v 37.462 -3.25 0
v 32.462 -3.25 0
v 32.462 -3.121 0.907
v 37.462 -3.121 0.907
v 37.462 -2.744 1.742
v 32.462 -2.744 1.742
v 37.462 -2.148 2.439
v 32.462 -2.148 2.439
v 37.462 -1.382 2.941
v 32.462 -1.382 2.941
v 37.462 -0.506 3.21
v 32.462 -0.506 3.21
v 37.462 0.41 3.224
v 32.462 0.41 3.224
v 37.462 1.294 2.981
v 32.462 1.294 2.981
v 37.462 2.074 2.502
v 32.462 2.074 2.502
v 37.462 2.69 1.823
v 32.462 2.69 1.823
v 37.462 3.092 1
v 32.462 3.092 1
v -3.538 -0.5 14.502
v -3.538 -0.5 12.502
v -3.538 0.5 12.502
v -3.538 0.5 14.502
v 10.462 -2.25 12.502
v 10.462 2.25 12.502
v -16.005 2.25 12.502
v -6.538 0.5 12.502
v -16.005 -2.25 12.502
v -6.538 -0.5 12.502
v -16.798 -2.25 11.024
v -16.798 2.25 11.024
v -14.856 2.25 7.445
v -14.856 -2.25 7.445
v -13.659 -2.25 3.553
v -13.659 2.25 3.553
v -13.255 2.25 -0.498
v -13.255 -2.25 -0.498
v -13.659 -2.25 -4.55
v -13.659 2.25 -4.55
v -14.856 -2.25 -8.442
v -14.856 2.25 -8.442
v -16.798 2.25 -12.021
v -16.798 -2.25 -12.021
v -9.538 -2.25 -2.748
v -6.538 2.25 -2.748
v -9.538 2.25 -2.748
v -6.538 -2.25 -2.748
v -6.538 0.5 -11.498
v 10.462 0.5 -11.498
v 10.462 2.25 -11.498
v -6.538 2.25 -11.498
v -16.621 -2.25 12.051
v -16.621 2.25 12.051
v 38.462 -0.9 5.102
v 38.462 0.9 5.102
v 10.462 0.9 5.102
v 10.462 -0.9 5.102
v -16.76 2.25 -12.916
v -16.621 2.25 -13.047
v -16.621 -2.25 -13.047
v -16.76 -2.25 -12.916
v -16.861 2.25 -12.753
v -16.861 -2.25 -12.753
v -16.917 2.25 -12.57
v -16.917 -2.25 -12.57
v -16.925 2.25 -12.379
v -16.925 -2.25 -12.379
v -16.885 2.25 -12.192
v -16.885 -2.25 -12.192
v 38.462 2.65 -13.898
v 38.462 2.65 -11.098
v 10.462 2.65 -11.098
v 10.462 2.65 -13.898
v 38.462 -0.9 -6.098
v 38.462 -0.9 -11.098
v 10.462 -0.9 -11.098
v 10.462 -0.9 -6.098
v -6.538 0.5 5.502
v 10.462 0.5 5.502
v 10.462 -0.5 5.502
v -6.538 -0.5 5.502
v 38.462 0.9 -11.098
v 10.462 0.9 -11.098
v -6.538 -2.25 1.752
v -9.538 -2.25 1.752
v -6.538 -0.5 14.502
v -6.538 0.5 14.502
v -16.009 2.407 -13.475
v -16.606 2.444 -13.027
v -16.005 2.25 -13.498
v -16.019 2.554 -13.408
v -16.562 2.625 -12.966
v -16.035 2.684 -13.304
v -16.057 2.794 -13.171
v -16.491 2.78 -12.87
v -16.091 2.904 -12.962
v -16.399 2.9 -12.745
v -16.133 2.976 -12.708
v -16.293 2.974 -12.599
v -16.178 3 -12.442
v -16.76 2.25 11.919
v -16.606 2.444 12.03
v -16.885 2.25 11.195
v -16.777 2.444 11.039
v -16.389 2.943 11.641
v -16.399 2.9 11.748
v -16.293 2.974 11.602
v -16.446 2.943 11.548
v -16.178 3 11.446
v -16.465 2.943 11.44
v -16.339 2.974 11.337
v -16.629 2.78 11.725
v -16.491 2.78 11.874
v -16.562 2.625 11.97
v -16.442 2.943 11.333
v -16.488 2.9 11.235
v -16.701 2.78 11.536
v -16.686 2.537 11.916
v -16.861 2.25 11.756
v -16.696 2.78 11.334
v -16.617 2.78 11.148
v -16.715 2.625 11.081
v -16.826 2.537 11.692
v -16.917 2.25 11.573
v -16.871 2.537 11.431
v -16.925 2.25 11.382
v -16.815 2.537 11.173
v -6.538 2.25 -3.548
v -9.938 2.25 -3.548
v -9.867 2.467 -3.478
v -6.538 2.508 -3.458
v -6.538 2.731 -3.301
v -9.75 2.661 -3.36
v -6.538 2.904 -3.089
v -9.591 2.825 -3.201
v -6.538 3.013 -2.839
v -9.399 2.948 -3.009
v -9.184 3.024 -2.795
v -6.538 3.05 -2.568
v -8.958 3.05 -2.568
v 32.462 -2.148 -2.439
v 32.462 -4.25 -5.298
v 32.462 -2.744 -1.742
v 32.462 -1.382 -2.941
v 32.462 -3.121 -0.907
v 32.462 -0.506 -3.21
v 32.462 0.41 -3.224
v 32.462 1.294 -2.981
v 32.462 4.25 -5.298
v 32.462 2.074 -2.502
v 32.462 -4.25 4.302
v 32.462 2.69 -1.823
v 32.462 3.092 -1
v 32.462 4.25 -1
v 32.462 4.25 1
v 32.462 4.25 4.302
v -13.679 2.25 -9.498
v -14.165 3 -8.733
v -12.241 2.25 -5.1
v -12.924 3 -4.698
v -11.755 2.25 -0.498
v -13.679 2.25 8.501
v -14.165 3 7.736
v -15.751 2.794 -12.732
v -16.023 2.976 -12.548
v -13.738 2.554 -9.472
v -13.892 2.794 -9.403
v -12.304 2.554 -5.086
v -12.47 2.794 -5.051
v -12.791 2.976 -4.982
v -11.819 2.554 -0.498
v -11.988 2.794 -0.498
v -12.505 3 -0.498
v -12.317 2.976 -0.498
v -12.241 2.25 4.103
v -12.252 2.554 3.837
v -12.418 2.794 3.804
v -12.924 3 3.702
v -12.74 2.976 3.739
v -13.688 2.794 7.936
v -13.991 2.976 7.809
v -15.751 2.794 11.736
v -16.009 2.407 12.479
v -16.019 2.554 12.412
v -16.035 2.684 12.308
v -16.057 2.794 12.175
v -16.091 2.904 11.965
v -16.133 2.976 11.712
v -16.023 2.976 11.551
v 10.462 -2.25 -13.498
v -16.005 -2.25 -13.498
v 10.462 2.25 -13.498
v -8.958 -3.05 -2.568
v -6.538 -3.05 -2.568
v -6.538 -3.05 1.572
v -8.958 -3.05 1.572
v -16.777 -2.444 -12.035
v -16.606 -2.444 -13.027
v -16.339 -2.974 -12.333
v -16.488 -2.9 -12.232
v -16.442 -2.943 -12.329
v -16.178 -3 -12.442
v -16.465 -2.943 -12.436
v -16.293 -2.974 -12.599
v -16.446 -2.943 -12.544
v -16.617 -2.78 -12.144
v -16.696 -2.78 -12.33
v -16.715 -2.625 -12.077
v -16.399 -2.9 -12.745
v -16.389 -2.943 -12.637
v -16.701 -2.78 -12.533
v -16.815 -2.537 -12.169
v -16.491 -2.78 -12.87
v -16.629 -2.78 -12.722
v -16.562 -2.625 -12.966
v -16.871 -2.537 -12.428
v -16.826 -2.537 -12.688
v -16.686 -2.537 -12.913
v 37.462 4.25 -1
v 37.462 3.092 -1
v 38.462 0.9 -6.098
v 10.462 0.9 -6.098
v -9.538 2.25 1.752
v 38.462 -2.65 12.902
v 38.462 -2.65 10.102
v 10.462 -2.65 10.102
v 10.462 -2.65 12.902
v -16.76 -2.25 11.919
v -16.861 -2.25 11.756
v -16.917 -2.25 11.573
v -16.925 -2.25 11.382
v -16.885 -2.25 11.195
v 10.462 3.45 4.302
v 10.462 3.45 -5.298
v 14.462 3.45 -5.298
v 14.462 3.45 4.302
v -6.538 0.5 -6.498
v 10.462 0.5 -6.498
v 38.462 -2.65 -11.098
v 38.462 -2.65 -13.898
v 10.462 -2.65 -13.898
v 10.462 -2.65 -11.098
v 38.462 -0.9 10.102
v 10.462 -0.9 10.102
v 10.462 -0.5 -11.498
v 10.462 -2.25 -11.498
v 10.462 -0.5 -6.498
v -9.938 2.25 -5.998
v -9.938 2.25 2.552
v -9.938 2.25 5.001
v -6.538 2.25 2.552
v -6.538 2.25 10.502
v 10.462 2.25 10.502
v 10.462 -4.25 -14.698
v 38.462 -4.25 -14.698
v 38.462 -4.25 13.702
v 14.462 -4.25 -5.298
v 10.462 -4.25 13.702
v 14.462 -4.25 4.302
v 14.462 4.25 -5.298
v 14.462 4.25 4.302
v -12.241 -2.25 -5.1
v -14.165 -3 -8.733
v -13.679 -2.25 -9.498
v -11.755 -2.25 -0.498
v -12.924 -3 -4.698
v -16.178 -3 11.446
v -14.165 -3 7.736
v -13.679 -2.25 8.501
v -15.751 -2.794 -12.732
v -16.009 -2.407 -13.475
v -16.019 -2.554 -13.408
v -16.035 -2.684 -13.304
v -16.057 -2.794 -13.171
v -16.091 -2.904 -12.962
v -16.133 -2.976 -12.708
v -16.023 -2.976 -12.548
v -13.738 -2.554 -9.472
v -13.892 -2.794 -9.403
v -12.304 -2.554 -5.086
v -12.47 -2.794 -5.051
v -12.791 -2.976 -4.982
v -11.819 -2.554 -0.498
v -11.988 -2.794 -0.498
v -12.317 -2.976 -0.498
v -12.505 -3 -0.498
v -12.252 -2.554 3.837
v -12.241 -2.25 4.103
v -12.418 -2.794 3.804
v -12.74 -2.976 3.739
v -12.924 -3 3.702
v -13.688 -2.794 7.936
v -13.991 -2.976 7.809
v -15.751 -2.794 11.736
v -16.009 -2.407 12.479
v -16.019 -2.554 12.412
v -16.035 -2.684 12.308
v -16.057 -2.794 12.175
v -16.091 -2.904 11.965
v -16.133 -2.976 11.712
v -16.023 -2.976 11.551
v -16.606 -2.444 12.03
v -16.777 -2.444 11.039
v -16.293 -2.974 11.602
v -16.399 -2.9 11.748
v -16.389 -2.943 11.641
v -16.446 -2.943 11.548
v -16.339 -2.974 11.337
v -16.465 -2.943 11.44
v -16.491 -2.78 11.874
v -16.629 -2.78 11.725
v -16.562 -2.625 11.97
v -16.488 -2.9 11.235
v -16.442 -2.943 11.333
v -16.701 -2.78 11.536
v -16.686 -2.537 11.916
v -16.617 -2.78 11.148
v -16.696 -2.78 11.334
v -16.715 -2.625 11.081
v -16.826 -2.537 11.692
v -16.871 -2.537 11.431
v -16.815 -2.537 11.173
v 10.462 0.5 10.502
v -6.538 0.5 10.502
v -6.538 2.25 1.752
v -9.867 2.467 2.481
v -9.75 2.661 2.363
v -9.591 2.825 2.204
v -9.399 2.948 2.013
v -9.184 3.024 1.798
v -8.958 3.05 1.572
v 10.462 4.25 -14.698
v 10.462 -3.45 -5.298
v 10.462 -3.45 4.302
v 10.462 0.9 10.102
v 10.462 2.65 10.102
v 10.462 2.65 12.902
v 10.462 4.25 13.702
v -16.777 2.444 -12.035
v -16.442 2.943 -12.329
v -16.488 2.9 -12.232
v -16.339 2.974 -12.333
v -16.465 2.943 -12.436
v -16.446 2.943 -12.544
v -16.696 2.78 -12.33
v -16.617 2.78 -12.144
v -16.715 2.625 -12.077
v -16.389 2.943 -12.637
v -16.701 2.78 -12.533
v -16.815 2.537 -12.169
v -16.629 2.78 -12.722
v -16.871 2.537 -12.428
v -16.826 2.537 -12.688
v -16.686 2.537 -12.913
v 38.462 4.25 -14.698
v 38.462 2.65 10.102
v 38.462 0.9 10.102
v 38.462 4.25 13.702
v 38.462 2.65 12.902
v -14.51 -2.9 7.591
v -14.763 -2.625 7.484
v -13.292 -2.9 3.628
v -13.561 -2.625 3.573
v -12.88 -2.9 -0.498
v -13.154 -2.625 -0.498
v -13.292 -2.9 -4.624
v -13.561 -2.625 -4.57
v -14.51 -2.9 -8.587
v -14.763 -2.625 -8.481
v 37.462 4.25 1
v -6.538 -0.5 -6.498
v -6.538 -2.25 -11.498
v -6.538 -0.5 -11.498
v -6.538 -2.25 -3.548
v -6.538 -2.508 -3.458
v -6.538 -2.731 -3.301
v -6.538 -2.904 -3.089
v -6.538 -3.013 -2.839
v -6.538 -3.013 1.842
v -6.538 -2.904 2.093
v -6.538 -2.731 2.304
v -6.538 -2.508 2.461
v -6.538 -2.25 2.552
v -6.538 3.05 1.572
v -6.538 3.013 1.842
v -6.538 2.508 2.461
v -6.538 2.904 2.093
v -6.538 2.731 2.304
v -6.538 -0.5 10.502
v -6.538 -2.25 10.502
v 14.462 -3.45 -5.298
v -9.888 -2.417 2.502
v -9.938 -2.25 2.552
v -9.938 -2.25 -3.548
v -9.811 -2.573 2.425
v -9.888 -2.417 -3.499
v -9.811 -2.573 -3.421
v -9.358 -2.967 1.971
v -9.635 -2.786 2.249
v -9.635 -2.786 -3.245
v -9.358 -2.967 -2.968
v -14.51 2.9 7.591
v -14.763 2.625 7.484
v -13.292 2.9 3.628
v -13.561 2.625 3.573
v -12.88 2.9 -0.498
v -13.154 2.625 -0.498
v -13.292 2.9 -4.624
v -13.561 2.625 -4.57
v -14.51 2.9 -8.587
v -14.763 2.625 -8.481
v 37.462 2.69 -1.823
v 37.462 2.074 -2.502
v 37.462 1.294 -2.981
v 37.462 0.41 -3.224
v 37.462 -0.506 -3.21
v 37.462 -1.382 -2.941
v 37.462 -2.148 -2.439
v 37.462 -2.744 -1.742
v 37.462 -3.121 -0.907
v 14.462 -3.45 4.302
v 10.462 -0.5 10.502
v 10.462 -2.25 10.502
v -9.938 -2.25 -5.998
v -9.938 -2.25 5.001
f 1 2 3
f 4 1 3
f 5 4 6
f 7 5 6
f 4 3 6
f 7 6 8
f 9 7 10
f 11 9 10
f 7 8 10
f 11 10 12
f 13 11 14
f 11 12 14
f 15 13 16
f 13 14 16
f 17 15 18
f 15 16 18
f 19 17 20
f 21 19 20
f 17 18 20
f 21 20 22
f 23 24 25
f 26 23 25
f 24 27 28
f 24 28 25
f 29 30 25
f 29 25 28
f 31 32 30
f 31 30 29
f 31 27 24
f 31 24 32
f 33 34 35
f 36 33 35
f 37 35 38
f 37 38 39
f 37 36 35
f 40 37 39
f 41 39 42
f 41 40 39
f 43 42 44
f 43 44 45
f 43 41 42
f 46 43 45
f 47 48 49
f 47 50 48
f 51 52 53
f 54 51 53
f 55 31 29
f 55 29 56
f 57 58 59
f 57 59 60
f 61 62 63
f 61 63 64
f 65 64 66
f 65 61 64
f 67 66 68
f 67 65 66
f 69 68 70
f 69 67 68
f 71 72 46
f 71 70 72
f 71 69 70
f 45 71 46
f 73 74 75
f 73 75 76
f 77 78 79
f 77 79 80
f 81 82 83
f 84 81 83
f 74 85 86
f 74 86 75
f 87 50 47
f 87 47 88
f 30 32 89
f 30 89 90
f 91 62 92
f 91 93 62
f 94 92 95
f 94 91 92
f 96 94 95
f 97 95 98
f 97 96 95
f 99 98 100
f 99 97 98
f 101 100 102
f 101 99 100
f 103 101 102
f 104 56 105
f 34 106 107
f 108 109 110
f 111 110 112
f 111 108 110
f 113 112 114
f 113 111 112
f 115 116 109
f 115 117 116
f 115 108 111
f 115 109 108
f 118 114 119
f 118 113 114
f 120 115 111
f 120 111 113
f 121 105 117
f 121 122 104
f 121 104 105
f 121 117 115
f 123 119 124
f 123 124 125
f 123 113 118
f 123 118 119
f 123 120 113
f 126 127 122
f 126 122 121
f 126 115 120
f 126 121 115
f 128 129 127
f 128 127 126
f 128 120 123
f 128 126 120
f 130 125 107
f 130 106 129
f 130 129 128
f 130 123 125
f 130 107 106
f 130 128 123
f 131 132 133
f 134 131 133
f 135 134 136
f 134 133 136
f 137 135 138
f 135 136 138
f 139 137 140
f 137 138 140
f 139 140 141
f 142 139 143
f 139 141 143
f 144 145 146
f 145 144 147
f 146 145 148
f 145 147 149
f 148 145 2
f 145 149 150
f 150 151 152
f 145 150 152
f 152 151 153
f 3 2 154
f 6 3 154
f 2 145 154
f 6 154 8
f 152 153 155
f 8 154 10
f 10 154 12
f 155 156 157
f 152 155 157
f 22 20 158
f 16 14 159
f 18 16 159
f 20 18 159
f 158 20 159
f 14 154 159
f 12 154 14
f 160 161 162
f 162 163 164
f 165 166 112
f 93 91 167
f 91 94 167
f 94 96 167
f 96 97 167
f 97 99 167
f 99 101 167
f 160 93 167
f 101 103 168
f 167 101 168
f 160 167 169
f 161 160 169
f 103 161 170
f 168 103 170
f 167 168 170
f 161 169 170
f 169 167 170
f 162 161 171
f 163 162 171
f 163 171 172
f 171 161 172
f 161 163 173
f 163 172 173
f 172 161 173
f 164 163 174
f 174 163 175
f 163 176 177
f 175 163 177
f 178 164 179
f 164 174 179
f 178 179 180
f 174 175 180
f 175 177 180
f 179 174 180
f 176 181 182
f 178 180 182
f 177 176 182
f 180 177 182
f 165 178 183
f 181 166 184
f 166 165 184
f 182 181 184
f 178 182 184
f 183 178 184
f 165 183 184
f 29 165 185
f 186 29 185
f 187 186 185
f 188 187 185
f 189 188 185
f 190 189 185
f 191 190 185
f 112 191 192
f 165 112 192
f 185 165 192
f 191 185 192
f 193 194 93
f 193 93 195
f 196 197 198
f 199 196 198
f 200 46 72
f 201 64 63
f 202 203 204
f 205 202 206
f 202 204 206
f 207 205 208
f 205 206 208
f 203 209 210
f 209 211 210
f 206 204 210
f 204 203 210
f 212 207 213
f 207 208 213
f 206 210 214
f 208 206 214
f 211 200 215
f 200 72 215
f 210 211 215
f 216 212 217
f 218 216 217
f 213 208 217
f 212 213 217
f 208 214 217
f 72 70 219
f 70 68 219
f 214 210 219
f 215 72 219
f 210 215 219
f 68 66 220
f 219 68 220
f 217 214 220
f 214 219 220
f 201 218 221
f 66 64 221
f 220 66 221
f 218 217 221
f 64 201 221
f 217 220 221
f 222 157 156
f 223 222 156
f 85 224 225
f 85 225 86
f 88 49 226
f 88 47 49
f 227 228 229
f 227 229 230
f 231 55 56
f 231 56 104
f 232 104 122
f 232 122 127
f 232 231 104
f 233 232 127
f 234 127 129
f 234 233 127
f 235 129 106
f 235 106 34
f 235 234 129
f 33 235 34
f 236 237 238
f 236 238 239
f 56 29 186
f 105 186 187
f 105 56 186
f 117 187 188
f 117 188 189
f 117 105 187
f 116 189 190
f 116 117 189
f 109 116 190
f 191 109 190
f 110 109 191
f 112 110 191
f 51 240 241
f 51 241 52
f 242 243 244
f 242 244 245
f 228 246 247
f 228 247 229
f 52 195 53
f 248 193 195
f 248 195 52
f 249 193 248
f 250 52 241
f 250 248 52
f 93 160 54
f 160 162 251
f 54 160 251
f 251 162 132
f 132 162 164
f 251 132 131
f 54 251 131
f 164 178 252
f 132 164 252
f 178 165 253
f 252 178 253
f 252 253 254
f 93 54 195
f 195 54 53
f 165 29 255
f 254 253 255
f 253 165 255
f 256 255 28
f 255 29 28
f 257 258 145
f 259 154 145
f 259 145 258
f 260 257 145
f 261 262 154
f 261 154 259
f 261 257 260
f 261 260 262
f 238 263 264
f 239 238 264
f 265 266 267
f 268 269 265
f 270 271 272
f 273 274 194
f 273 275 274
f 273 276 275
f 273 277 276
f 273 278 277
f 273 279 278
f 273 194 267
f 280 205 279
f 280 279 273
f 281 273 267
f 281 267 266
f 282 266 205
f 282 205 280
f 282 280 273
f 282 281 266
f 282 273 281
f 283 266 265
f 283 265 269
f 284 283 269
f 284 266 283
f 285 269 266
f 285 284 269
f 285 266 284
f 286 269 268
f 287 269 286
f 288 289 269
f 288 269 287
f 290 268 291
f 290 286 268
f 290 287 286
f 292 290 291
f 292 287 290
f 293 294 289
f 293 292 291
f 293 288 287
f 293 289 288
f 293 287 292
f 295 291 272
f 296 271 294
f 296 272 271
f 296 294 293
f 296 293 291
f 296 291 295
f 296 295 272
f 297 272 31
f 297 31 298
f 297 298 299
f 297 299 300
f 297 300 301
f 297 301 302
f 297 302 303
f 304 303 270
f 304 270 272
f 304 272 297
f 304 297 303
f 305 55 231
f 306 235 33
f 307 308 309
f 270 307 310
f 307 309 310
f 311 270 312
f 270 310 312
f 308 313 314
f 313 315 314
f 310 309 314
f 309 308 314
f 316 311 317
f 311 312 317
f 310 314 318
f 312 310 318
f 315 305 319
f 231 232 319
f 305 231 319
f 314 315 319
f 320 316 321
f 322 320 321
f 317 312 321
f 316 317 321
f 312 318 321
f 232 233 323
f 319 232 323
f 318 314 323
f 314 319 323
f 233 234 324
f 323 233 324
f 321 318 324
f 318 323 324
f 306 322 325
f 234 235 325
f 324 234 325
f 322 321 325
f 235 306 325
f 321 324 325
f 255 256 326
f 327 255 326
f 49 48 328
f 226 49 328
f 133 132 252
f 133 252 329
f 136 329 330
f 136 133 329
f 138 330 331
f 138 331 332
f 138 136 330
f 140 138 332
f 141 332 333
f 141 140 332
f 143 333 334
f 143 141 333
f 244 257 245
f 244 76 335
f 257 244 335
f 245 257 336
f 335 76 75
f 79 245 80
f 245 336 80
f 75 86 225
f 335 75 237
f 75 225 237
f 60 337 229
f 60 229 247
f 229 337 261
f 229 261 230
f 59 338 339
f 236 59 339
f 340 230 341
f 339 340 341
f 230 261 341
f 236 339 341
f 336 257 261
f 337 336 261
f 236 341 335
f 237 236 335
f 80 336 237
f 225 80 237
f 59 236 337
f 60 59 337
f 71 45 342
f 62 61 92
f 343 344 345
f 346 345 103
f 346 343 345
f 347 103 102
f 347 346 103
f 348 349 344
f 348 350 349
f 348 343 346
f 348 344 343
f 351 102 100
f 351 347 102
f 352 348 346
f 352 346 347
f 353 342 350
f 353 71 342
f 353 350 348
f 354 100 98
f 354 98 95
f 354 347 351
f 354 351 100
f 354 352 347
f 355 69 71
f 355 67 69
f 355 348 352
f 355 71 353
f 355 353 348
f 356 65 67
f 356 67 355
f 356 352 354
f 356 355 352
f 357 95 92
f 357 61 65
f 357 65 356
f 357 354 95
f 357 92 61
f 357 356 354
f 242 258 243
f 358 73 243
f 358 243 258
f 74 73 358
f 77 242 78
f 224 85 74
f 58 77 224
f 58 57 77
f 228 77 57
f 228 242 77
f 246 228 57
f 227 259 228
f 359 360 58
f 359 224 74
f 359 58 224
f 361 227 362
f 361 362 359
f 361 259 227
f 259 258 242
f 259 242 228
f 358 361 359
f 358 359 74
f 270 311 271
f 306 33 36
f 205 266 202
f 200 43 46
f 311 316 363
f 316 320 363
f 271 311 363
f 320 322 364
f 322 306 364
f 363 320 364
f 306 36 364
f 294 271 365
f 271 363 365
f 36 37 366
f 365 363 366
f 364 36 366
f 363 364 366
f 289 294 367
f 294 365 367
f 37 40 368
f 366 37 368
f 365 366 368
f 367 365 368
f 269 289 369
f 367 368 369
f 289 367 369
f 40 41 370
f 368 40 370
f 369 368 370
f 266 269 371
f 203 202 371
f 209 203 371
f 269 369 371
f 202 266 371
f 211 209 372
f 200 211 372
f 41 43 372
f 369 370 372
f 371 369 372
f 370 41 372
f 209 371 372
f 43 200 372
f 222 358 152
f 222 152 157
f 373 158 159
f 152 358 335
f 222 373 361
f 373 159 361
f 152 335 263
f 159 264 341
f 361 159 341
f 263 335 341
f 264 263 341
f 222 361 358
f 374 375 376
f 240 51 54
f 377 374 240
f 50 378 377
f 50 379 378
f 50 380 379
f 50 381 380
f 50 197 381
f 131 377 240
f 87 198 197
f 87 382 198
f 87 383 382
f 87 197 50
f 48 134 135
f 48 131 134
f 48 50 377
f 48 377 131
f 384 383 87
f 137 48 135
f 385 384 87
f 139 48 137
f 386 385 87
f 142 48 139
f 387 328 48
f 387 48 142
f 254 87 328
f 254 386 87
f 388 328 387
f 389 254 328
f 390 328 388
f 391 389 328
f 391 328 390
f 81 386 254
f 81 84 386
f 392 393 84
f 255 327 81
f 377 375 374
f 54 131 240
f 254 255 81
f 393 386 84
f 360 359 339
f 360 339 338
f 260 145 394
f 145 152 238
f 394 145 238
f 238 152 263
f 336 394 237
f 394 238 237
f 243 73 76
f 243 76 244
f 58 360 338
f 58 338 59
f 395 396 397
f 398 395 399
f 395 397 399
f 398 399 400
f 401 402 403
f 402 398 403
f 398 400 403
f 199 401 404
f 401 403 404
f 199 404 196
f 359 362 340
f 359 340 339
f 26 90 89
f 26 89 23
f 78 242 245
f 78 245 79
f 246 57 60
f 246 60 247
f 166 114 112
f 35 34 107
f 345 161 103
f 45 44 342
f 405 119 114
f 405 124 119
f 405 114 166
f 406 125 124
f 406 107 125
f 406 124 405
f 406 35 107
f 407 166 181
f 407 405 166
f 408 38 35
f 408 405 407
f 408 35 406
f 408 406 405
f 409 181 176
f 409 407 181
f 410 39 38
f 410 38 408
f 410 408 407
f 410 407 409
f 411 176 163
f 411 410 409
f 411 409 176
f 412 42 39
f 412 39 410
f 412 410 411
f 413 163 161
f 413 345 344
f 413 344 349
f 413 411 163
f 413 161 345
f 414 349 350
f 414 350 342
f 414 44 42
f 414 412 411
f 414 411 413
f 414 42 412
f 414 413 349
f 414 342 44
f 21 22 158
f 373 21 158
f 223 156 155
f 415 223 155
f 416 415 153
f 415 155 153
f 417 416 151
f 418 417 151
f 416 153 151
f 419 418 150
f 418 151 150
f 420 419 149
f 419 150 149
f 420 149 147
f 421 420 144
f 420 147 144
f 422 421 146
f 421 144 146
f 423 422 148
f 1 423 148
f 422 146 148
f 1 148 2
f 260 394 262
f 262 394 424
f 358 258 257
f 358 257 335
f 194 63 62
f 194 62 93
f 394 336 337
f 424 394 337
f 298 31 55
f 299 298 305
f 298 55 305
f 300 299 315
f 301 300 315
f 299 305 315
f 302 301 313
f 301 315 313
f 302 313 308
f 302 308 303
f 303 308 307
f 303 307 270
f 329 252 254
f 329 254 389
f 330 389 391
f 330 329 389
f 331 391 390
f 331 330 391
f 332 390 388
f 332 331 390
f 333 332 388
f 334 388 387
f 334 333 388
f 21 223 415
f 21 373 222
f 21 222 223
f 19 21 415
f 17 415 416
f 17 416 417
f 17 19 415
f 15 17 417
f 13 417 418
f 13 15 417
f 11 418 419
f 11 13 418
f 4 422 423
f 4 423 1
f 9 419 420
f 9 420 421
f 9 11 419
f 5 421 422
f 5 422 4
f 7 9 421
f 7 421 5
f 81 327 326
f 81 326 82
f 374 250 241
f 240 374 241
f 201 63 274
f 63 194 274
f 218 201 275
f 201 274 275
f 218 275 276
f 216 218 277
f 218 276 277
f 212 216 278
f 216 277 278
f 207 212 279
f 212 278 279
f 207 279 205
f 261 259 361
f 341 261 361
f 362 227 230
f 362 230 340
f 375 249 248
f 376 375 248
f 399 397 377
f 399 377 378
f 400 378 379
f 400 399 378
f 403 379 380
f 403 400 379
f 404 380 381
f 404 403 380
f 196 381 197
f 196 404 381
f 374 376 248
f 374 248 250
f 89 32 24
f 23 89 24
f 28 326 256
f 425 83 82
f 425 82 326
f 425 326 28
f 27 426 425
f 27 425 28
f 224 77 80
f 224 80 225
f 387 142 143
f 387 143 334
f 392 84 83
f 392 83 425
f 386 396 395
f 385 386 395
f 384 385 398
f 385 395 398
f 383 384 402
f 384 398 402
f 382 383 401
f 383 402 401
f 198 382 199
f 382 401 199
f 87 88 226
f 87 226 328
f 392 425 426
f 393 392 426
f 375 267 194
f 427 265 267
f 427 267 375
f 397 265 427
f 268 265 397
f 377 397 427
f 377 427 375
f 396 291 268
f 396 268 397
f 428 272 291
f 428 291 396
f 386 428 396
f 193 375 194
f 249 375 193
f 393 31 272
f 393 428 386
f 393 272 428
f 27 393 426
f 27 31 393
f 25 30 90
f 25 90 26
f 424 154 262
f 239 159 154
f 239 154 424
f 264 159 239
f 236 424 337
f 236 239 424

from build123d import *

# Parameters (mm, degrees)
F1_DEPTH    = 2.25
F2_W        = 6.1
F2_H        = 6.1
F2_W_2      = 4.5
F2_H_2      = 4.5
F3_DEPTH    = 3.4
F5_DEPTH    = 3
F6_R        = 0.74999
F7_T1_DEPTH = 10.9989794856
F7_T3_DEPTH = 5.8494897428
F9_DEPTH    = 17
F10_W       = 3
F10_H       = 1
F11_DEPTH   = 2
F12_W       = 8.5
F12_H       = 28.4
F12_W_2     = 6.9
F12_H_2     = 9.6
F13_DEPTH   = 28
F15_W       = 22
F15_H       = 9.6
F16_DEPTH   = 15.5
F17_DEPTH   = 6
F19_DEPTH   = 5


# Not quite as in the source:
# - a fillet or chamfer that OpenCascade refuses, or shapes differently, is made with other operations: its cross-section is extruded or revolved along the edge and cut away or added
# - a fillet or chamfer is up to 0.001 mm smaller than in the source, because OpenCascade refuses the exact size


with BuildPart() as f1:
    # F0 (on Front) → F1 (new body, symmetric)
    with BuildSketch(Plane.XZ):
        with BuildLine():
            Line((-9.5380139407, -2.7482741908), (-9.5380139407, 1.7517258092))
            Line((-9.5380139407, 1.7517258092), (-6.5380139407, 1.7517258092))
            Line((-6.5380139407, 1.7517258092), (-6.5380139407, 4.7517258092))
            Line((-6.5380139407, 4.7517258092), (10.4619860593, 4.7517258092))
            Line((10.4619860593, 4.7517258092), (10.4619860593, 12.5017258092))
            Line((10.4619860593, 12.5017258092), (-16.0051570773, 12.5017258092))
            ThreePointArc((-16.0051570773, 12.5017258092), (-11.7548404249, -0.4982741908), (-16.0051570773, -13.4982741908))
            Line((-16.0051570773, -13.4982741908), (10.4619860593, -13.4982741908))
            Line((10.4619860593, -13.4982741908), (10.4619860593, -5.7482741908))
            Line((10.4619860593, -5.7482741908), (-6.5380139407, -5.7482741908))
            Line((-6.5380139407, -5.7482741908), (-6.5380139407, -2.7482741908))
            Line((-6.5380139407, -2.7482741908), (-9.5380139407, -2.7482741908))
        make_face()
    extrude(amount=F1_DEPTH, both=True)

    # F2 (on face) → F3 (join)
    with BuildSketch(Plane.YZ.offset(-6.5380139407)):
        with Locations((0, -0.4982741908)):
            Rectangle(F2_W, F2_H)
        with Locations((0, -0.4982741908)):
            Rectangle(F2_W_2, F2_H_2, mode=Mode.SUBTRACT)
    extrude(amount=-F3_DEPTH)

    # F4 (on Front) → F5 (join, symmetric)
    with BuildSketch(Plane.XZ):
        with BuildLine():
            ThreePointArc((-16.0051570773, -13.4982741908), (-11.7548404249, -0.4982741908), (-16.0051570773, 12.5017258092))
            Line((-16.0051570773, 12.5017258092), (-17.2154421685, 11.6156050511))
            ThreePointArc((-17.2154421685, 11.6156050511), (-13.2548404249, -0.4982741908), (-17.2154421685, -12.6121534326))
            Line((-17.2154421685, -12.6121534326), (-16.0051570773, -13.4982741908))
        make_face()
    extrude(amount=F5_DEPTH, both=True)

    # F6 (radius 0.75 in the source; OpenCascade refuses exactly that, so slightly less here)
    f6_edges = [f1.edges().sort_by_distance(p)[0] for p in [
        (-16.6103, -3, 12.058665),
        (-13.25484, -3, -0.498274),
        (-16.6103, -3, -13.055214),
        (-11.75484, -3, -0.498274),
        (-16.6103, 3, 12.058665),
        (-13.25484, 3, -0.498274),
        (-16.6103, 3, -13.055214),
        (-11.75484, 3, -0.498274),
        (-17.215442, 0, -12.612153),
        (-17.215442, 0, 11.615605),
    ]]
    fillet(f6_edges, radius=F6_R)

    # F7: fillet of radius 1 on 6 edges, made by hand

    # F7_s2 → F7_t1 (cut)
    with BuildSketch(Plane.XY.offset(-5.9977639336)):
        with BuildLine():
            ThreePointArc((-9.9380139407, -2.25), (-9.5906735756, -2.8245966692), (-8.9582180436, -3.05))
            Line((-8.9582180436, -3.05), (-9.9380139407, -3.05))
            Line((-9.9380139407, -3.05), (-9.9380139407, -2.25))
        make_face()
        with BuildLine():
            ThreePointArc((-9.9380139407, 2.25), (-9.5906735756, 2.8245966692), (-8.9582180436, 3.05))
            Line((-8.9582180436, 3.05), (-9.9380139407, 3.05))
            Line((-9.9380139407, 3.05), (-9.9380139407, 2.25))
        make_face()
    extrude(amount=F7_T1_DEPTH, mode=Mode.SUBTRACT)

    # F7_s4 → F7_t3 (cut)
    with BuildSketch(Plane.YZ.offset(-9.9380139407)):
        with BuildLine():
            ThreePointArc((-2.25, -3.5482741908), (-2.8245966692, -3.2009338257), (-3.05, -2.5684782937))
            Line((-3.05, -2.5684782937), (-3.05, -3.5482741908))
            Line((-3.05, -3.5482741908), (-2.25, -3.5482741908))
        make_face()
        with BuildLine():
            ThreePointArc((-2.25, 2.5517258092), (-2.8245966692, 2.2043854441), (-3.05, 1.5719299121))
            Line((-3.05, 1.5719299121), (-3.05, 2.5517258092))
            Line((-3.05, 2.5517258092), (-2.25, 2.5517258092))
        make_face()
        with BuildLine():
            ThreePointArc((2.25, 2.5517258092), (2.8245966692, 2.2043854441), (3.05, 1.5719299121))
            Line((3.05, 1.5719299121), (3.05, 2.5517258092))
            Line((3.05, 2.5517258092), (2.25, 2.5517258092))
        make_face()
        with BuildLine():
            ThreePointArc((2.25, -3.5482741908), (2.8245966692, -3.2009338257), (3.05, -2.5684782937))
            Line((3.05, -2.5684782937), (3.05, -3.5482741908))
            Line((3.05, -3.5482741908), (2.25, -3.5482741908))
        make_face()
    extrude(amount=F7_T3_DEPTH, mode=Mode.SUBTRACT)

    # F8 (on face) → F9 (cut, through all)
    with BuildSketch(Plane.YZ.offset(10.4619860593)):
        Polygon((-2.25, 10.5017258092), (-2.25, 4.7517258092), (2.25, 4.7517258092), (2.25, 10.5017258092), (0.5, 10.5017258092), (0.5, 5.5017258092), (-0.5, 5.5017258092), (-0.5, 10.5017258092), align=None)
        Polygon((2.25, -11.4982741908), (2.25, -5.7482741908), (-2.25, -5.7482741908), (-2.25, -11.4982741908), (-0.5, -11.4982741908), (-0.5, -6.4982741908), (0.5, -6.4982741908), (0.5, -11.4982741908), align=None)
    extrude(amount=-F9_DEPTH, mode=Mode.SUBTRACT)

    # F10 (on face) → F11 (join)
    with BuildSketch(Plane.XY.offset(12.5017258092)):
        with Locations((-5.0380139407, 0)):
            Rectangle(F10_W, F10_H)
    extrude(amount=F11_DEPTH)


with BuildPart() as f13:
    # F12 (on face) → F13 (new body)
    with BuildSketch(Plane.YZ.offset(10.4619860593)):
        with Locations((0, -0.4982741908)):
            Rectangle(F12_W, F12_H)
        Polygon((-0.9, -6.0982741908), (0.9, -6.0982741908), (0.9, -11.0982741908), (2.65, -11.0982741908), (2.65, -13.8982741908), (-2.65, -13.8982741908), (-2.65, -11.0982741908), (-0.9, -11.0982741908), align=None, mode=Mode.SUBTRACT)
        with Locations((0, -0.4982741908)):
            Rectangle(F12_W_2, F12_H_2, mode=Mode.SUBTRACT)
        Polygon((0.9, 10.1017258092), (0.9, 5.1017258092), (-0.9, 5.1017258092), (-0.9, 10.1017258092), (-2.65, 10.1017258092), (-2.65, 12.9017258092), (2.65, 12.9017258092), (2.65, 10.1017258092), align=None, mode=Mode.SUBTRACT)
    extrude(amount=F13_DEPTH)

    # F15 (on face) → F16 (cut)
    with BuildSketch(Plane(origin=(0, 4.25, 0), x_dir=(-1, 0, 0), z_dir=(0, 1, 0))):
        with Locations((-25.4619860593, -0.4982741908)):
            Rectangle(F15_W, F15_H)
    extrude(amount=-F16_DEPTH, mode=Mode.SUBTRACT)

    # F14 (on face) → F17 (join)
    with BuildSketch(Plane.YZ.offset(38.4619860593)):
        Polygon((3.45, 4.3017258092), (-3.45, 4.3017258092), (-4.25, 4.3017258092), (-4.25, -5.2982741908), (-3.45, -5.2982741908), (3.45, -5.2982741908), (4.25, -5.2982741908), (4.25, 4.3017258092), align=None)
    extrude(amount=-F17_DEPTH)

    # F18 (on face) → F19 (cut)
    with BuildSketch(Plane(origin=(32.4619860593, 0, 0), x_dir=(0, -1, 0), z_dir=(-1, 0, 0))):
        with BuildLine():
            ThreePointArc((-3.0923292192, -1), (0.5061768651, -3.2103403217), (3.25, 0))
            ThreePointArc((3.25, 0), (0.5061768651, 3.2103403217), (-3.0923292192, 1))
            ThreePointArc((-3.0923292192, 1), (-3.25, 0), (-3.0923292192, -1))
        make_face()
        with BuildLine():
            ThreePointArc((-3.0923292192, -1), (-3.25, 0), (-3.0923292192, 1))
            Line((-3.0923292192, 1), (-4.25, 1))
            Line((-4.25, 1), (-4.25, -1))
            Line((-4.25, -1), (-3.0923292192, -1))
        make_face()
    extrude(amount=-F19_DEPTH, mode=Mode.SUBTRACT)


solid = Compound([f1.part, f13.part])
